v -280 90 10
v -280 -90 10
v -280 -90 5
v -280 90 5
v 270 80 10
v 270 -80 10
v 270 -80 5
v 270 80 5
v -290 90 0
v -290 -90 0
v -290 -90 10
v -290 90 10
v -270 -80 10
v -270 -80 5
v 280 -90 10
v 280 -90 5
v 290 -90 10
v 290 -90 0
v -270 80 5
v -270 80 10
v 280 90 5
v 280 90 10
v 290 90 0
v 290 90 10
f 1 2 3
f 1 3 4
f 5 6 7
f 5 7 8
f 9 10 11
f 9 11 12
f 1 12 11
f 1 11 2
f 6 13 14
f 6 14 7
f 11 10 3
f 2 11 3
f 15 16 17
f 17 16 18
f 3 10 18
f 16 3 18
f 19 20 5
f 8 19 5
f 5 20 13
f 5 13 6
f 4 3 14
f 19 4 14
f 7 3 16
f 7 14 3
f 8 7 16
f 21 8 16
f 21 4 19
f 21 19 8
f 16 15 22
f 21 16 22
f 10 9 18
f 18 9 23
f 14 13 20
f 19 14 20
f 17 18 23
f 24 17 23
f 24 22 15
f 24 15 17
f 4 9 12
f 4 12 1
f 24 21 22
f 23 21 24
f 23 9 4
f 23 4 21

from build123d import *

# Parameters (mm, degrees)
F0_W     = 580
F0_H     = 180
F1_DEPTH = 10
F2_W     = 560
F2_H     = 180
F2_W_2   = 540
F2_H_2   = 160
F3_DEPTH = 5


with BuildPart() as f1:
    # F0 (on Top) → F1 (new body)
    with BuildSketch(Plane.XY):
        Rectangle(F0_W, F0_H)
    extrude(amount=F1_DEPTH)

    # F2 (on face) → F3 (cut)
    with BuildSketch(Plane.XY.offset(10)):
        Rectangle(F2_W, F2_H)
        Rectangle(F2_W_2, F2_H_2, mode=Mode.SUBTRACT)
    extrude(amount=-F3_DEPTH, mode=Mode.SUBTRACT)


solid = f1.part
